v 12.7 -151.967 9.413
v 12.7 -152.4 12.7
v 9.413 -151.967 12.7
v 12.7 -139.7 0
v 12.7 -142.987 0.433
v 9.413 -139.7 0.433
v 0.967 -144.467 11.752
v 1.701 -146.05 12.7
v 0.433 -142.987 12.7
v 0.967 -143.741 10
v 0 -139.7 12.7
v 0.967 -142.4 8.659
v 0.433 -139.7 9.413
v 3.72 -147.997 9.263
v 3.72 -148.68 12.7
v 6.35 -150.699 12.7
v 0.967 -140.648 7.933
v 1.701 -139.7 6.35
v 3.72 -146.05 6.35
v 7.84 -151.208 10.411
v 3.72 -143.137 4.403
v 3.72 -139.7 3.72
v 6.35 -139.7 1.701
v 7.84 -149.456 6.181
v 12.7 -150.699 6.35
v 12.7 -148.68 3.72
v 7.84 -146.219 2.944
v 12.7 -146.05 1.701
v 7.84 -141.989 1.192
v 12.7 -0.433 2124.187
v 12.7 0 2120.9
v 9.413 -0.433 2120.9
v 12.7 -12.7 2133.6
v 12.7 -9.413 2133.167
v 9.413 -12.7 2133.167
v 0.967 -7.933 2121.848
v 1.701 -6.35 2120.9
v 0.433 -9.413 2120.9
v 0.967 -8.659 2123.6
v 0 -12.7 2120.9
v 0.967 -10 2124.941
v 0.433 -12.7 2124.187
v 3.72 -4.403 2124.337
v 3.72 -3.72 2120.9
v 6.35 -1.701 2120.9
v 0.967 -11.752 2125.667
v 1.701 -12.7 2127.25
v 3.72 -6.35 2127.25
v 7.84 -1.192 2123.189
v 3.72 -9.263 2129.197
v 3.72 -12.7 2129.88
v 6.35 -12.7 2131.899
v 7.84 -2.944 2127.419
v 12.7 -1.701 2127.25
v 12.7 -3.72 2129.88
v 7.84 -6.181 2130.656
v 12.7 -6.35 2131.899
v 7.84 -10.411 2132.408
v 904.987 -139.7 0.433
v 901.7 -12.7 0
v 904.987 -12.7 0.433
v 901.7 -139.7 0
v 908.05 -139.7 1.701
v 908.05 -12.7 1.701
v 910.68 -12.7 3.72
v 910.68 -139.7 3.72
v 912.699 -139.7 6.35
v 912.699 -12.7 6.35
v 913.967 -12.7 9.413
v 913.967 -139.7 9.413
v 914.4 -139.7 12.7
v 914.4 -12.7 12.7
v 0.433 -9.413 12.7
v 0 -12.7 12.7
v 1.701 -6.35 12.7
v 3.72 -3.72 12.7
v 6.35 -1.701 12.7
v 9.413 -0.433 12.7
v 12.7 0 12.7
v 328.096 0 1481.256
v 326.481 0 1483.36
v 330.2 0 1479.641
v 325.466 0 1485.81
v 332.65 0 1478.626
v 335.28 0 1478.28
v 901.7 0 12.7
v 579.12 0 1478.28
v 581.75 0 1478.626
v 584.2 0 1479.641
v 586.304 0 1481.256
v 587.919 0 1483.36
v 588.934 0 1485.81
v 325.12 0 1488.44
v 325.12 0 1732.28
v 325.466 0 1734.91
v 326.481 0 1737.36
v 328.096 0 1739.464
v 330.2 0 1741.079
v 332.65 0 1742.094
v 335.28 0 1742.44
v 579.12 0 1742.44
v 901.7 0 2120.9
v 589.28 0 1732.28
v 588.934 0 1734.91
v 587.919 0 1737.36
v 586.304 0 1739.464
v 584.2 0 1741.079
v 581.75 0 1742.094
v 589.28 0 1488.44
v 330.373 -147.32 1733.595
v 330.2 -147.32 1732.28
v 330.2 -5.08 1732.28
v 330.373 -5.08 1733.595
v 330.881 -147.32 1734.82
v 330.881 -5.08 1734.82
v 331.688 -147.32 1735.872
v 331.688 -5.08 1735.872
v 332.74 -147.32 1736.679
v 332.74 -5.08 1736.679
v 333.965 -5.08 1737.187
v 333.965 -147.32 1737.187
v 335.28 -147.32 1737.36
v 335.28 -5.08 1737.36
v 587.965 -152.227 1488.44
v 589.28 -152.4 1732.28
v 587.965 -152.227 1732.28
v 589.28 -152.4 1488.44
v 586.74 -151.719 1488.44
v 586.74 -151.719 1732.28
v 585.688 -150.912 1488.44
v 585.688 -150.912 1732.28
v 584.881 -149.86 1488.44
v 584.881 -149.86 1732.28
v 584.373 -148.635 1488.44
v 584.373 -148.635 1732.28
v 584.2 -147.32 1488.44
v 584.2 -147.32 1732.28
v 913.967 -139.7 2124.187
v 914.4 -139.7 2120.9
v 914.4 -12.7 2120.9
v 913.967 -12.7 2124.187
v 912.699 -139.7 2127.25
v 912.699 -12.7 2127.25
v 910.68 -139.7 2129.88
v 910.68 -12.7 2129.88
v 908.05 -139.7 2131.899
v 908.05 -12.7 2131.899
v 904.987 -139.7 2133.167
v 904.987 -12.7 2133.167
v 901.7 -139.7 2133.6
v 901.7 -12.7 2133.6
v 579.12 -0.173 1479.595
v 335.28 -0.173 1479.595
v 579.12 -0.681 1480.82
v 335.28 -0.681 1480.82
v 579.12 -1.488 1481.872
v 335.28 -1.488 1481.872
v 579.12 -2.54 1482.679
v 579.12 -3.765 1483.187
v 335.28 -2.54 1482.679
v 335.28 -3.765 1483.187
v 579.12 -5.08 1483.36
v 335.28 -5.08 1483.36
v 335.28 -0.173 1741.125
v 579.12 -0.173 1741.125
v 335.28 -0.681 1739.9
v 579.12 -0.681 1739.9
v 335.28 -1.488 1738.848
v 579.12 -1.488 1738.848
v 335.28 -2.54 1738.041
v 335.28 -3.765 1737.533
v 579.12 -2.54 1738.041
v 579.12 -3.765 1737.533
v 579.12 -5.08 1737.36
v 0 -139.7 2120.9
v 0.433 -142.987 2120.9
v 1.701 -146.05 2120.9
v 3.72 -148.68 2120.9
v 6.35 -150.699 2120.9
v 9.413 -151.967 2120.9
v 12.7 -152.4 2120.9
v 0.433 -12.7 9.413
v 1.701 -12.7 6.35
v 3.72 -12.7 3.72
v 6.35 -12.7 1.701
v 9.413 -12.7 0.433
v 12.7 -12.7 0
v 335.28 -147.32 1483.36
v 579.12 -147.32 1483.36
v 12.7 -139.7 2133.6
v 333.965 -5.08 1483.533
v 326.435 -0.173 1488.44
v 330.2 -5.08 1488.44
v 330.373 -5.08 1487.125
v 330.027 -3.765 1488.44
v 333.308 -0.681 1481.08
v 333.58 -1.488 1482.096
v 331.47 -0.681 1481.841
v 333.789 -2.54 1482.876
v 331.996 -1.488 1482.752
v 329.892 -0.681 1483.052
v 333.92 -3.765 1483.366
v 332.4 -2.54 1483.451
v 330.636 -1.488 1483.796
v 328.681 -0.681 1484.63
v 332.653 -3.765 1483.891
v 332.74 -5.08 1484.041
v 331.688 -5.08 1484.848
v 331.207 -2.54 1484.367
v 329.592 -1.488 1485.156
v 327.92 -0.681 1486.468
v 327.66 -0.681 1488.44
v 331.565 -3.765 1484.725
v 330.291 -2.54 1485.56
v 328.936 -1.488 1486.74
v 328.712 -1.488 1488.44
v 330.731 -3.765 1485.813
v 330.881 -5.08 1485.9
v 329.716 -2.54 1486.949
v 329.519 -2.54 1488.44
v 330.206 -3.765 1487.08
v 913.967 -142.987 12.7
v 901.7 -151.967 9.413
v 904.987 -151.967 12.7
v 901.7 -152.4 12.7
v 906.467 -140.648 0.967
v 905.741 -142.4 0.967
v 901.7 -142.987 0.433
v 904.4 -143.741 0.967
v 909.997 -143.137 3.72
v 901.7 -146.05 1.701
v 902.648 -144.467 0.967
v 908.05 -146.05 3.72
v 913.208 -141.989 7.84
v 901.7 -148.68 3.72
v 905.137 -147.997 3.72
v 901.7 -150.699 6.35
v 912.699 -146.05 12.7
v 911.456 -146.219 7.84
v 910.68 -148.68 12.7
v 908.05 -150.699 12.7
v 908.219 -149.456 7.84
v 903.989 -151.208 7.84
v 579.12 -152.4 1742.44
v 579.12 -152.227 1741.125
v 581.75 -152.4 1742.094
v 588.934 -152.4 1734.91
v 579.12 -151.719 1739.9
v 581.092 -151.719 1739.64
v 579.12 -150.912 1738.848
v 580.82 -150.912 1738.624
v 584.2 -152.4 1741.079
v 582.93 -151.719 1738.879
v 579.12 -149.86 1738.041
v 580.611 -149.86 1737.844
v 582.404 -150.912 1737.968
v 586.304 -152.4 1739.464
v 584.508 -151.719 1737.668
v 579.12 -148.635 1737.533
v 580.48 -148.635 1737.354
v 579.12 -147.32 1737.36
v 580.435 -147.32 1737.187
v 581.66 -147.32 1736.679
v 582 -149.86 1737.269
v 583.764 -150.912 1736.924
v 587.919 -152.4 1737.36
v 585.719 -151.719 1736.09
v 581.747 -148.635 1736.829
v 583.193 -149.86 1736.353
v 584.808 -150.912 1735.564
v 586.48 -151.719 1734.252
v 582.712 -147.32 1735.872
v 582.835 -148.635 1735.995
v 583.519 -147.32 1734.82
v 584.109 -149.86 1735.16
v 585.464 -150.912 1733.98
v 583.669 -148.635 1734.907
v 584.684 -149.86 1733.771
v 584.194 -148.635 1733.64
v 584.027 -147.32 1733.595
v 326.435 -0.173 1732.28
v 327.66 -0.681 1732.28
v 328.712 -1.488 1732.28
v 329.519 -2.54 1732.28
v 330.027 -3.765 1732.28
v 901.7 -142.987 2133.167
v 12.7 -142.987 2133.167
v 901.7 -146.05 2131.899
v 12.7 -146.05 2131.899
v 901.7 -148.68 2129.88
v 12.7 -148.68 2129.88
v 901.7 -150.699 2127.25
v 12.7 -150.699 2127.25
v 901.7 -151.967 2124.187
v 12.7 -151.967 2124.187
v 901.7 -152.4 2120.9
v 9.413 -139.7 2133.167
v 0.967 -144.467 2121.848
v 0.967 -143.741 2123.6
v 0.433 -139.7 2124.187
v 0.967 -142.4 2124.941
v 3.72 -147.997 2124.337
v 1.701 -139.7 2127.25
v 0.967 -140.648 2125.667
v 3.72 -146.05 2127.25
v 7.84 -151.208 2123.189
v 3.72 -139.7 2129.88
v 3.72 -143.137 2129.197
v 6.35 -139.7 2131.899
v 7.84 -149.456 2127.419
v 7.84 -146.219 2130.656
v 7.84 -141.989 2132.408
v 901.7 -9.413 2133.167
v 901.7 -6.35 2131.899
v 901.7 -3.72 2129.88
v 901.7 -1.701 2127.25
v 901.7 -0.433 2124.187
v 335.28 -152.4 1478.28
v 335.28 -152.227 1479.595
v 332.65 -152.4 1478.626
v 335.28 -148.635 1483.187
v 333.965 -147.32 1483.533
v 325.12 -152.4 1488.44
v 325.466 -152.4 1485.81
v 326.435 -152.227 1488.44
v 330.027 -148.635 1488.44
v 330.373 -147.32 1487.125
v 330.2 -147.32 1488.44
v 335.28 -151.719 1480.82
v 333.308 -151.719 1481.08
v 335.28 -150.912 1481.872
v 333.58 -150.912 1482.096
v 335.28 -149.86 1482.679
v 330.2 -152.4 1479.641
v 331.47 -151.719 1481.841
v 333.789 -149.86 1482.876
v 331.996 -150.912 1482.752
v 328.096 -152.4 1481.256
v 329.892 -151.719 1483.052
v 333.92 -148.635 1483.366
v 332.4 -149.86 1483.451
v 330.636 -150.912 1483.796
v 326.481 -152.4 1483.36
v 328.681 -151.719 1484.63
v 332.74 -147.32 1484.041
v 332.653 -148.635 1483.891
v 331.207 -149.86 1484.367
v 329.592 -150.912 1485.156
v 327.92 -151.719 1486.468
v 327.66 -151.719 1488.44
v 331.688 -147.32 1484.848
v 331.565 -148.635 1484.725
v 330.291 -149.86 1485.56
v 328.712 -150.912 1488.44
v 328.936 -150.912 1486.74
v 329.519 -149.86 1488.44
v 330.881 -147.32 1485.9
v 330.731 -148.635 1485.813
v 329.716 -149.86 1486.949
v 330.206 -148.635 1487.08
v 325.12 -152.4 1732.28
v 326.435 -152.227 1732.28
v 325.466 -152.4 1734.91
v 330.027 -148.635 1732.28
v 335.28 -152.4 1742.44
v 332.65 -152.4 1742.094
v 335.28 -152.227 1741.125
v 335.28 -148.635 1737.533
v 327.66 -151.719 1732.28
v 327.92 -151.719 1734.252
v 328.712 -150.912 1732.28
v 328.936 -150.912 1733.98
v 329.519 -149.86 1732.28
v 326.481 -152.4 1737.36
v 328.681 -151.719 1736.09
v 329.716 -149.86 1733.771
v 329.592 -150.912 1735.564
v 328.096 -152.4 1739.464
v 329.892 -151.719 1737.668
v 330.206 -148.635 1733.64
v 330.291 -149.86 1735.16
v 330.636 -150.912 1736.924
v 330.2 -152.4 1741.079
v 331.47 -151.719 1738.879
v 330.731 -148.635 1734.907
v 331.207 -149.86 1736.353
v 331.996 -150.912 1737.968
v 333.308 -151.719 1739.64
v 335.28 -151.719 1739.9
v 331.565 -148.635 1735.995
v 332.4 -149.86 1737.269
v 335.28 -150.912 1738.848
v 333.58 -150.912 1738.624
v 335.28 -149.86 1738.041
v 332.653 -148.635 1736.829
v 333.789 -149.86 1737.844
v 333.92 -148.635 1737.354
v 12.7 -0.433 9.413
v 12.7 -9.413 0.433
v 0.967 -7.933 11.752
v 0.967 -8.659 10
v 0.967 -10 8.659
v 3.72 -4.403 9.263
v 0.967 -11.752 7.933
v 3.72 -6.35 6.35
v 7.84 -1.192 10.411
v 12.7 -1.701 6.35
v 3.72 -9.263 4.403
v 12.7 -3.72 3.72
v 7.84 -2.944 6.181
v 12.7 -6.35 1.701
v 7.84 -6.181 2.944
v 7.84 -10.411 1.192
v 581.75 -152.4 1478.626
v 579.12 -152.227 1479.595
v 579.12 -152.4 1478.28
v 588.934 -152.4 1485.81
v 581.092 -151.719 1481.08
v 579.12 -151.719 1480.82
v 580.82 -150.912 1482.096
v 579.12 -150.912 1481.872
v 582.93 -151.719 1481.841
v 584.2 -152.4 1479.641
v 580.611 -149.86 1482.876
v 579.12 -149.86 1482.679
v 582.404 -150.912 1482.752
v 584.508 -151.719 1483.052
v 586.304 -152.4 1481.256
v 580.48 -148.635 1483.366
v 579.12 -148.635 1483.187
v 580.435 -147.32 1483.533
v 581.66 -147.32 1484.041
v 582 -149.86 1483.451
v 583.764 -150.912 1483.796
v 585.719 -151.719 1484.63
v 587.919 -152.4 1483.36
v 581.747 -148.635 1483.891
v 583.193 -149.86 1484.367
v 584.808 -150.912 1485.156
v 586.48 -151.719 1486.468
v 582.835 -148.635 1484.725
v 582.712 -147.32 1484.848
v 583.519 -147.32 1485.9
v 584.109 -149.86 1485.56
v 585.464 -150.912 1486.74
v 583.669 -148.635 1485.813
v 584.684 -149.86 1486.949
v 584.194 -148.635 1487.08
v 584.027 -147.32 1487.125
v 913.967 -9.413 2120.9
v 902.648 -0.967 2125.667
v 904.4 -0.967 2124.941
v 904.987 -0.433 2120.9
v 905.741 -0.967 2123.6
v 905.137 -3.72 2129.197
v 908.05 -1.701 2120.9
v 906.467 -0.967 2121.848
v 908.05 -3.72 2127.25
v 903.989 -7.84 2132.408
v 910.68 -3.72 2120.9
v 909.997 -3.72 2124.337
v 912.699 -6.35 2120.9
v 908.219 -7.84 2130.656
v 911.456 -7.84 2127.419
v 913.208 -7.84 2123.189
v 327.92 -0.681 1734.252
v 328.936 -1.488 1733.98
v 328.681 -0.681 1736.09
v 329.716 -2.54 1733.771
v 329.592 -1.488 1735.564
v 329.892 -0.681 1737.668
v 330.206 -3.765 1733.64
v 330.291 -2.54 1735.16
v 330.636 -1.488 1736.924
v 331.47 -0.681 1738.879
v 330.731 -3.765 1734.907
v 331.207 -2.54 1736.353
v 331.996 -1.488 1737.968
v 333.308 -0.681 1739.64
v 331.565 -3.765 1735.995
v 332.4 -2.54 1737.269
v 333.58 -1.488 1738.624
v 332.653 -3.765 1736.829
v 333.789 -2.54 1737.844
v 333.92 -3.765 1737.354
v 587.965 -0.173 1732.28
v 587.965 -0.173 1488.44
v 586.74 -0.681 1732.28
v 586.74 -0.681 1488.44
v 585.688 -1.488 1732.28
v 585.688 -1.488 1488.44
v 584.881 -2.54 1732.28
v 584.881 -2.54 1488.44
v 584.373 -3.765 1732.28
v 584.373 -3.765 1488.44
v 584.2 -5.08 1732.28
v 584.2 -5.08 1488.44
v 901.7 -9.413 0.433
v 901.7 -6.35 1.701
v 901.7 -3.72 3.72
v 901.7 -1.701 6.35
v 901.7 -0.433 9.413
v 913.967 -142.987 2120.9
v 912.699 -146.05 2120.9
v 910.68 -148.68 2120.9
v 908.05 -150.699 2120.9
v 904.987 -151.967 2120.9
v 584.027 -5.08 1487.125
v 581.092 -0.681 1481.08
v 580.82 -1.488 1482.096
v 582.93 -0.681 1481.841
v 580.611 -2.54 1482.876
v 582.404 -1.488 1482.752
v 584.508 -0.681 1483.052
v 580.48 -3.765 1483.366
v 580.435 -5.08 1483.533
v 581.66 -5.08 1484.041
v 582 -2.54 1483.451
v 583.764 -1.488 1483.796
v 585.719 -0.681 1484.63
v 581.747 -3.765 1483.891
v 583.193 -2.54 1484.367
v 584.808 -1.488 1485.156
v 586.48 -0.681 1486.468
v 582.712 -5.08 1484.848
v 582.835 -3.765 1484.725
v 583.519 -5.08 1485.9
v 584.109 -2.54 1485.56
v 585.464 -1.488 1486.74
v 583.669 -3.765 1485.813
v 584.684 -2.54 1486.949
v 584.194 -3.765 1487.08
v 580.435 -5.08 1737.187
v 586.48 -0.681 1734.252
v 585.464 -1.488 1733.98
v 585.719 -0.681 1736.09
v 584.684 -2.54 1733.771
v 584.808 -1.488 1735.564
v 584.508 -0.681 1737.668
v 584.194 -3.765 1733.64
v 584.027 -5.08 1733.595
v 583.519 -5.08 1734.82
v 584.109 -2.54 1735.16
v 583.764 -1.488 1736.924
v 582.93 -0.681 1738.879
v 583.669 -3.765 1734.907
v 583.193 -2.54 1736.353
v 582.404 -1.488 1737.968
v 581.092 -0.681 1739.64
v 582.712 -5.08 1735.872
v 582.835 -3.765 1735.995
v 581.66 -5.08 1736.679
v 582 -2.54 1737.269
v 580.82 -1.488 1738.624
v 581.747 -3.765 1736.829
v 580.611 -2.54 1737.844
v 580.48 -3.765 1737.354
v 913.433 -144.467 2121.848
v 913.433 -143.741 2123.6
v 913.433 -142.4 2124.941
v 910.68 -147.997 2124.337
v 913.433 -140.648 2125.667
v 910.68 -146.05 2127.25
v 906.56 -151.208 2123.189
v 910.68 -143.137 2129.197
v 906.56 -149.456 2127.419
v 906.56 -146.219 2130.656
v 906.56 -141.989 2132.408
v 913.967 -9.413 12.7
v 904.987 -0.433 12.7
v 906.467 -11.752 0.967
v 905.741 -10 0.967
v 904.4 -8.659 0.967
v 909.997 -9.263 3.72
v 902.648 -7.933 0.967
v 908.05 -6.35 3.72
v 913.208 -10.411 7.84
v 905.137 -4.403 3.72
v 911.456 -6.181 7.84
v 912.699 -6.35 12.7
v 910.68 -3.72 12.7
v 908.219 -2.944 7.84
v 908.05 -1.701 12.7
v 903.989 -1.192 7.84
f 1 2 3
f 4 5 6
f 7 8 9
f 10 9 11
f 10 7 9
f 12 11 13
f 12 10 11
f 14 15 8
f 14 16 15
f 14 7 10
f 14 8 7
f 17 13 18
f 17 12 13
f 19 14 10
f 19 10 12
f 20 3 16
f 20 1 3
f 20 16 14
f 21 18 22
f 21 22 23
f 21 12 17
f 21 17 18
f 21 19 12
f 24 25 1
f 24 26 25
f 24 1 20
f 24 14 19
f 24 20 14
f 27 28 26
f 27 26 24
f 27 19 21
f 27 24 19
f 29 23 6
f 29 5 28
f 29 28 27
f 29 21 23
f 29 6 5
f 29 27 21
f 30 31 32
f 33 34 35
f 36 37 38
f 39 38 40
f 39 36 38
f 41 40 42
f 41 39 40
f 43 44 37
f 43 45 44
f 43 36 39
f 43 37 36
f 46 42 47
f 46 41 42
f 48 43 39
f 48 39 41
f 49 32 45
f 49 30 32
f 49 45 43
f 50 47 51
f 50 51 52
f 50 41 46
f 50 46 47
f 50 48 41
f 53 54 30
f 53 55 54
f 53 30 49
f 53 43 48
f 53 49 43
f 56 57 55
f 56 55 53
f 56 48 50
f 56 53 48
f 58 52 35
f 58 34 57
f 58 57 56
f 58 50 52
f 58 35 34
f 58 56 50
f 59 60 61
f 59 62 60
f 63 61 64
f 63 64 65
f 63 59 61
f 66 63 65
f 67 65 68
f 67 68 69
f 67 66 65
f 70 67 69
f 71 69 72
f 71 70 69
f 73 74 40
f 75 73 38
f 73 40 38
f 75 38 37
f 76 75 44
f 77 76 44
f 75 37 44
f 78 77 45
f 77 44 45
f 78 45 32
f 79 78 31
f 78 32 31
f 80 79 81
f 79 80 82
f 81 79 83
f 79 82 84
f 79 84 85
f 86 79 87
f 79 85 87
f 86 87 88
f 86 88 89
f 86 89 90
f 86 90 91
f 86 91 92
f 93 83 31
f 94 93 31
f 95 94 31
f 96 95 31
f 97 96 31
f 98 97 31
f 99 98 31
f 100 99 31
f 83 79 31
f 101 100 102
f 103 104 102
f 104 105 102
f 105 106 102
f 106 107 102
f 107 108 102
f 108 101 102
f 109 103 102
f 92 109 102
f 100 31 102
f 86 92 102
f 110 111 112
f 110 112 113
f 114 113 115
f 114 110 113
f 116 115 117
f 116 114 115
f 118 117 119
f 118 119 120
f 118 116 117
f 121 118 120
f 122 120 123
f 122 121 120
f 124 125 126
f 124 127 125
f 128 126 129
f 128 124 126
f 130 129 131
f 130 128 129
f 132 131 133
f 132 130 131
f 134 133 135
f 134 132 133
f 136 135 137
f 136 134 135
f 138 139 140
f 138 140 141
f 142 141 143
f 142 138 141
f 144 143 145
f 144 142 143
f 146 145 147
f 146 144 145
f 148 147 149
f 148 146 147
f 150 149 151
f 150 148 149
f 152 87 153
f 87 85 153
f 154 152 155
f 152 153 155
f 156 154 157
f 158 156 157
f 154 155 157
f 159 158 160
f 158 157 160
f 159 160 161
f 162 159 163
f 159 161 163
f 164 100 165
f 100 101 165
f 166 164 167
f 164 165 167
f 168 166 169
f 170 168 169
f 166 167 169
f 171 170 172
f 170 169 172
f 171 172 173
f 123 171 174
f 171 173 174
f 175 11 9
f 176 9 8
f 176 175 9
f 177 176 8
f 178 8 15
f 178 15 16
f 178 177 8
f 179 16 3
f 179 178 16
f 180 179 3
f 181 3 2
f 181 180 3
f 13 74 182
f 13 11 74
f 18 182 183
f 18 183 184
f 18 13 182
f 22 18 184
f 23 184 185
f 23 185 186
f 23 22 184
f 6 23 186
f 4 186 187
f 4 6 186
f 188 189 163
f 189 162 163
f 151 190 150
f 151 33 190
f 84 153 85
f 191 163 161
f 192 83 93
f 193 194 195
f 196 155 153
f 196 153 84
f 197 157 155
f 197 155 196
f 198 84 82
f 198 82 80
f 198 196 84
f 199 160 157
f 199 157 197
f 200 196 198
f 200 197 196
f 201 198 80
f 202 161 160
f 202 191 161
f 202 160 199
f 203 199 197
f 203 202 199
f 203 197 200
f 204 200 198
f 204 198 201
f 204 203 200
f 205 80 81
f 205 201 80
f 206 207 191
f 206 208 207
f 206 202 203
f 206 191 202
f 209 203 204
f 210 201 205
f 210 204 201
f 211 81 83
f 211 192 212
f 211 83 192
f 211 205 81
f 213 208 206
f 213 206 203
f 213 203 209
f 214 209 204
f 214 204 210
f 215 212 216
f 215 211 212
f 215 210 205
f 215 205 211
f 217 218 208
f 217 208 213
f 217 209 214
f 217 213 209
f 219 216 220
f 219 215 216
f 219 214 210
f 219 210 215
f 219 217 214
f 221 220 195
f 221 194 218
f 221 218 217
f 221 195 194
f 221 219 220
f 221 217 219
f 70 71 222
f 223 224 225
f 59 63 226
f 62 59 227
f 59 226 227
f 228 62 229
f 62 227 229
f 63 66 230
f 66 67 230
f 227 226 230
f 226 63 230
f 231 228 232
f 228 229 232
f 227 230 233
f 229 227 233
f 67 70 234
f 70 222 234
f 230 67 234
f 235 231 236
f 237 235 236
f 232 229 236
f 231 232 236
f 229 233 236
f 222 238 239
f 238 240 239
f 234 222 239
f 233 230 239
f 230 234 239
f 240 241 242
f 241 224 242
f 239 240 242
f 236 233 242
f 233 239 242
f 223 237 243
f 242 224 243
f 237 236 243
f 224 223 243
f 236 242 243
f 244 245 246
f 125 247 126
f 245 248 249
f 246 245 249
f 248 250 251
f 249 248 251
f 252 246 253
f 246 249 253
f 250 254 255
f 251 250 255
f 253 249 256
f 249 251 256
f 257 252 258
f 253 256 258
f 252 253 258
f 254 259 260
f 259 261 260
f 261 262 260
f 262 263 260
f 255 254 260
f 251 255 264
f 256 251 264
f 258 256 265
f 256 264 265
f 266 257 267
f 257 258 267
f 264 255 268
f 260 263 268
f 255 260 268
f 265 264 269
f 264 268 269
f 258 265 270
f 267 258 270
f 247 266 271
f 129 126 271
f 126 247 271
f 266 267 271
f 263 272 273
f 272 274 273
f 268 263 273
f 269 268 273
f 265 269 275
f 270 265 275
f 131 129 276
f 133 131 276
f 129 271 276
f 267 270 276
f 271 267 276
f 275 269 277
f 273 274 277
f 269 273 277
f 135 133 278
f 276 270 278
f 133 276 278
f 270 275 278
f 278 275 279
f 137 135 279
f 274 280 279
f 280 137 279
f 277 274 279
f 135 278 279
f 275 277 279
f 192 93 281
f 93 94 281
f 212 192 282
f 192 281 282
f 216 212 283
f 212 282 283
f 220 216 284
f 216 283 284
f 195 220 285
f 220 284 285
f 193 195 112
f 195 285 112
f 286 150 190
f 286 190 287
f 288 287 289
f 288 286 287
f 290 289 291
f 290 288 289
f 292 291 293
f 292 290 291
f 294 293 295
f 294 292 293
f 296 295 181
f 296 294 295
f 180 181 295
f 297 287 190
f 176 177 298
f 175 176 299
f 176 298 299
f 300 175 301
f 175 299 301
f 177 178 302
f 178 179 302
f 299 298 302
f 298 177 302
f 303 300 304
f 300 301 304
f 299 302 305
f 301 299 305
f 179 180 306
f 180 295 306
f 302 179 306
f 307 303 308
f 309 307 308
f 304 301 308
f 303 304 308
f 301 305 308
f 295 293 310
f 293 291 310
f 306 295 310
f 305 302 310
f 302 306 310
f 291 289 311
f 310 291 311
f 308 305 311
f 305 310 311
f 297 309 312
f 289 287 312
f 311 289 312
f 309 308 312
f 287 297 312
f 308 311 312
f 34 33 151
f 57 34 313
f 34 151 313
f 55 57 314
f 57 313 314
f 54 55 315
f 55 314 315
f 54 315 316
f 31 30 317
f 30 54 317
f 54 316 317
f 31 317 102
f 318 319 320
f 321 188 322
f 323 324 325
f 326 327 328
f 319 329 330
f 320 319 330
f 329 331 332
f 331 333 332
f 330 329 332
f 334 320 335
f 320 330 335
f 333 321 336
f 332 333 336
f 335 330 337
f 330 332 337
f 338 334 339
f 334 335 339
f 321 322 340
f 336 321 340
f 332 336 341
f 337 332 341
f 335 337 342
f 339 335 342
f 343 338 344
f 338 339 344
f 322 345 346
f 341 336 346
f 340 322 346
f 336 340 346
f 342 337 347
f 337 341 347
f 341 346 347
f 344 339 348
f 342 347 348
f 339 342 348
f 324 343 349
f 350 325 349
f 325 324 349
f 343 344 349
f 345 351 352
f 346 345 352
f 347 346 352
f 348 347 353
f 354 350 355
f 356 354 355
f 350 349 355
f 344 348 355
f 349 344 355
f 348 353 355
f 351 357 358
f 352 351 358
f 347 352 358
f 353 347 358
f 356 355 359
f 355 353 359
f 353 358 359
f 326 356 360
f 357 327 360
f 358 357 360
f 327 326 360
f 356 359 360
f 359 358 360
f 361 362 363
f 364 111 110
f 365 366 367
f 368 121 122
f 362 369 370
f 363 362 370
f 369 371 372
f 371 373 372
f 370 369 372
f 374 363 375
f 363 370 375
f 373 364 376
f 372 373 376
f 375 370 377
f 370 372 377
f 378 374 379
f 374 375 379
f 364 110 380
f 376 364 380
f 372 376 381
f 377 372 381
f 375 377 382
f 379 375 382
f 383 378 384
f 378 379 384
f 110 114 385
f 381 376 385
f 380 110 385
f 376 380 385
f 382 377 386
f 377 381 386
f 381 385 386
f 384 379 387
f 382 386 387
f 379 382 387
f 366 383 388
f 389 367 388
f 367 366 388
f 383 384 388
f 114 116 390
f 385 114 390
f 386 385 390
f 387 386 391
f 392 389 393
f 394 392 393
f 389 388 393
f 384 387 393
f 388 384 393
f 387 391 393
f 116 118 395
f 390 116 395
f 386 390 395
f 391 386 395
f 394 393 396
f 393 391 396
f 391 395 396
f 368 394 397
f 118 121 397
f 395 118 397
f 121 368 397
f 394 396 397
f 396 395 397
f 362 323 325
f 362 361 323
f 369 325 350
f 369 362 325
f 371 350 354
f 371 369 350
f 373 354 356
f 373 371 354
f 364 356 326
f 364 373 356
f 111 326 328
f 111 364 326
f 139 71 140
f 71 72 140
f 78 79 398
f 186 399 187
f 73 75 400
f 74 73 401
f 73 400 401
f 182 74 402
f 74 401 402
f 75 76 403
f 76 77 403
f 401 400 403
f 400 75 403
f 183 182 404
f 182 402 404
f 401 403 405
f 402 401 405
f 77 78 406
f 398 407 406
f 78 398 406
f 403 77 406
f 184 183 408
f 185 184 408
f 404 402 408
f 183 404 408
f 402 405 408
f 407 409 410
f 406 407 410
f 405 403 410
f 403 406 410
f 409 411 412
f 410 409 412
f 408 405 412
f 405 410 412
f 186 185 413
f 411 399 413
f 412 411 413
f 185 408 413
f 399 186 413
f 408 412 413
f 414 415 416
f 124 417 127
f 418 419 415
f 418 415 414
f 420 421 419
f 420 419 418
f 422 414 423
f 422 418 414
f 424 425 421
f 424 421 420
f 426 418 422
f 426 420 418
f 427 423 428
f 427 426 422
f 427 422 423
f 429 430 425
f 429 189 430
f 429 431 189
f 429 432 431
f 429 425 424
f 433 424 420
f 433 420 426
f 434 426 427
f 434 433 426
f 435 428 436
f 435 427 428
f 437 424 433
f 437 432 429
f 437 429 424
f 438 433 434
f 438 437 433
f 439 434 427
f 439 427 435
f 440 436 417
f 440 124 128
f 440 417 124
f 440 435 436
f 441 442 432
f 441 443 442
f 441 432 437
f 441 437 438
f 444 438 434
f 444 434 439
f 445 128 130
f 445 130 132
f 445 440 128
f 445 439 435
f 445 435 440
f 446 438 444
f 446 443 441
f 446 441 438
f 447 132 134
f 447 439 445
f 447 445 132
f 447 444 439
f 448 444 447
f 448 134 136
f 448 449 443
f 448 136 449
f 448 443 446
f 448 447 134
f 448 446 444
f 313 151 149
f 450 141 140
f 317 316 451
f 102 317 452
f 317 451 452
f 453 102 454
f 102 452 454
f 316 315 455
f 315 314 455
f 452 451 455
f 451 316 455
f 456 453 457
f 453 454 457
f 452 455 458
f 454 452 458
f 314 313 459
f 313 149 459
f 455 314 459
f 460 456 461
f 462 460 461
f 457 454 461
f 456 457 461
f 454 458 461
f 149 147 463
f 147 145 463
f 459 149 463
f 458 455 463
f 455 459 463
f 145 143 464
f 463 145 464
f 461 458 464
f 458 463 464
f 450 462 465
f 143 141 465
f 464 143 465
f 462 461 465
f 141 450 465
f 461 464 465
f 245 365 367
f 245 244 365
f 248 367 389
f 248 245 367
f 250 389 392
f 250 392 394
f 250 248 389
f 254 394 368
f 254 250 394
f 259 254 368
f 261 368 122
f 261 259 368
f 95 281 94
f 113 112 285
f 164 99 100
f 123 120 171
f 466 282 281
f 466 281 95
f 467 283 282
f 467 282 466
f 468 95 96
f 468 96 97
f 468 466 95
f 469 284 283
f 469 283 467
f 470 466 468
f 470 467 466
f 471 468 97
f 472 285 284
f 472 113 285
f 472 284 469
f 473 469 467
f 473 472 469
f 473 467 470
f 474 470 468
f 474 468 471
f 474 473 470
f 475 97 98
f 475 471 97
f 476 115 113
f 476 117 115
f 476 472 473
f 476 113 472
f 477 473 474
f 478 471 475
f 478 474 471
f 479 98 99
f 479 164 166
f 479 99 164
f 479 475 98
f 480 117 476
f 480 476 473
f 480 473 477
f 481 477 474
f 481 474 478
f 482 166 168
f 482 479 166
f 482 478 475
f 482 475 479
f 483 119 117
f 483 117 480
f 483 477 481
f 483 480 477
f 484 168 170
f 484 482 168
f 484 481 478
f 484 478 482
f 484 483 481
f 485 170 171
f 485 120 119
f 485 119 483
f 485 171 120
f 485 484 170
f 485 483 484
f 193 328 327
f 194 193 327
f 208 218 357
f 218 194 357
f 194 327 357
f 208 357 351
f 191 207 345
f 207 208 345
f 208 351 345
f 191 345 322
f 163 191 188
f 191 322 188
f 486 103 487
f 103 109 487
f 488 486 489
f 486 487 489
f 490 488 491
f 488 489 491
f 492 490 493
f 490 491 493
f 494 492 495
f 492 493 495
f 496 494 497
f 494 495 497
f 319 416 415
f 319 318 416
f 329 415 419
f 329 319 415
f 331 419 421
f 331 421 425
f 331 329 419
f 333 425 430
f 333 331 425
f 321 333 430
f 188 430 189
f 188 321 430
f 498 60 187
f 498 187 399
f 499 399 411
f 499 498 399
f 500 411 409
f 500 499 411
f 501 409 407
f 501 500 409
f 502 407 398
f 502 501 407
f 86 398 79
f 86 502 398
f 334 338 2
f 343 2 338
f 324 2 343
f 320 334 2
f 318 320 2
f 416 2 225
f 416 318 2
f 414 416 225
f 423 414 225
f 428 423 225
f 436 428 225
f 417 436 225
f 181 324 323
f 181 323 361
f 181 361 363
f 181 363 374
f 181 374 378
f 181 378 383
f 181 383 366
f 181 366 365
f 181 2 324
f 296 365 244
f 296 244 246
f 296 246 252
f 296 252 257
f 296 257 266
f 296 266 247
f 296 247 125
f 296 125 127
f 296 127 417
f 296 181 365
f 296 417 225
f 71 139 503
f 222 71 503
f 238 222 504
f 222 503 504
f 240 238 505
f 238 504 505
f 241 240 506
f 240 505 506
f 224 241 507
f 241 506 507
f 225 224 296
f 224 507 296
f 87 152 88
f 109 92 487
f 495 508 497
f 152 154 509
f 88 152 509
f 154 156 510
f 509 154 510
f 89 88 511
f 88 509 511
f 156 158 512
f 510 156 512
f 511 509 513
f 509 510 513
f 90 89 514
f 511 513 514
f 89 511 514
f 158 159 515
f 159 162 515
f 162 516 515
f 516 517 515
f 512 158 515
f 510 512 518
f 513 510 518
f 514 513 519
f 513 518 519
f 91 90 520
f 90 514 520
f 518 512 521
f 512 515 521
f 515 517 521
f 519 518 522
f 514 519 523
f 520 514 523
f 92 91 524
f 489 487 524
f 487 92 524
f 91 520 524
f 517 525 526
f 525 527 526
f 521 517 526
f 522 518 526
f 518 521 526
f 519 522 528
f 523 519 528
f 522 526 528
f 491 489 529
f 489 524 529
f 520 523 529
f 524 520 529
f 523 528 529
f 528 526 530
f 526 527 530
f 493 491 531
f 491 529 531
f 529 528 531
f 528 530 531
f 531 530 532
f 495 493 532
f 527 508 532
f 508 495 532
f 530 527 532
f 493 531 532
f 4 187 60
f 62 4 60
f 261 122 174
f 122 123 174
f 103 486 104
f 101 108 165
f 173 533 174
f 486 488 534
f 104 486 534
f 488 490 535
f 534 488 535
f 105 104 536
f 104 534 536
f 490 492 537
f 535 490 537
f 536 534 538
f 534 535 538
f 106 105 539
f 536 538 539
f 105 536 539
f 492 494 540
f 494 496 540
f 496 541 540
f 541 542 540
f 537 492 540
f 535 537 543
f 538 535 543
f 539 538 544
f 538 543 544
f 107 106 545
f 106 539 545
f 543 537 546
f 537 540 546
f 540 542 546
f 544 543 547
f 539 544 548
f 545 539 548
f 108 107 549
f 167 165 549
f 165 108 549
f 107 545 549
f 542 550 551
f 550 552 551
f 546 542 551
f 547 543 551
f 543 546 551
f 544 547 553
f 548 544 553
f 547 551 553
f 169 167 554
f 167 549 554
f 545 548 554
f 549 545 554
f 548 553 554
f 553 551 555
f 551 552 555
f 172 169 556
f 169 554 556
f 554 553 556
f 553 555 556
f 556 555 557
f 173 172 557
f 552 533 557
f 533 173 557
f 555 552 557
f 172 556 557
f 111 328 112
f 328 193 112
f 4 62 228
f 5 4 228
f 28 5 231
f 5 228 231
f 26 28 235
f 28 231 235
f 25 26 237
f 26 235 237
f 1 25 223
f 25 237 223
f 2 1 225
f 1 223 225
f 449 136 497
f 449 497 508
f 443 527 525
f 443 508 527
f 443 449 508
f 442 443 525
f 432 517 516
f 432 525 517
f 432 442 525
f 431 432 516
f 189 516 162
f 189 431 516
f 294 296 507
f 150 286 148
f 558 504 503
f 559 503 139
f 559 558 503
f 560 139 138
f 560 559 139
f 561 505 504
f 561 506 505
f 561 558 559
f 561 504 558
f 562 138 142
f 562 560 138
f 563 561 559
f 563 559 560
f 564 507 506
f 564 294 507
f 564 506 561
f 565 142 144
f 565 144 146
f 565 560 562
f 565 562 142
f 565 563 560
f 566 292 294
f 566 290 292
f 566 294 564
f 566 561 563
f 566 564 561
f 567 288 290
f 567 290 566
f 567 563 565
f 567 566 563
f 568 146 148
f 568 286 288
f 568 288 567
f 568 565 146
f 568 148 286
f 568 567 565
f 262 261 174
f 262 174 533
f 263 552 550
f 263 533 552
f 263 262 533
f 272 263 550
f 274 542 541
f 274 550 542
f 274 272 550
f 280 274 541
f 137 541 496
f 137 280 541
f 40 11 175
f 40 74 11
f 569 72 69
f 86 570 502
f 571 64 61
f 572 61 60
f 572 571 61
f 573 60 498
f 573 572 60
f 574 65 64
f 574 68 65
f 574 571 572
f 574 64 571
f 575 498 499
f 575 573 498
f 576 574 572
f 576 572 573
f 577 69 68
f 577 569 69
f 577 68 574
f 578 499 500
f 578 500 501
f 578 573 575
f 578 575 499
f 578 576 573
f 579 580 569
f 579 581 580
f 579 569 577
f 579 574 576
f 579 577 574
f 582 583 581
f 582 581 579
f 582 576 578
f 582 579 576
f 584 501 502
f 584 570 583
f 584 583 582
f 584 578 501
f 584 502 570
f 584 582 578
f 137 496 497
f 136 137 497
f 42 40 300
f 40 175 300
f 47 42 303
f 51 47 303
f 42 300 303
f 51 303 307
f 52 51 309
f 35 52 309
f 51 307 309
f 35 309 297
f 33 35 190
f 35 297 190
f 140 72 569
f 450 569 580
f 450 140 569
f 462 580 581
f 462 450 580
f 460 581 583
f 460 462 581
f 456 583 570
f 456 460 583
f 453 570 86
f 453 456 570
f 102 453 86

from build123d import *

# Parameters (mm, degrees)
F0_W     = 914.4
F0_H     = 2133.6
F1_DEPTH = 152.4
F2_R     = 12.7
F3_R     = 5.08


# Not quite as in the source:
# - a feature names something its author has since deleted; it is built from what else it names


with BuildPart() as f1:
    # F0 (on Front) → F1 (new body)
    with BuildSketch(Plane.XZ):
        with Locations((457.2, 1066.8)):
            Rectangle(F0_W, F0_H)
        Polygon((330.2, 1737.36), (457.2, 1737.36), (584.2, 1737.36), (584.2, 1483.36), (330.2, 1483.36), align=None, mode=Mode.SUBTRACT)
    extrude(amount=F1_DEPTH)

    # F2
    f2_edges = [f1.edges().sort_by_distance(p)[0] for p in [
        (457.2, -152.4, 2133.6),
        (914.4, -152.4, 1066.8),
        (914.4, -76.2, 2133.6),
        (457.2, 0, 2133.6),
        (914.4, 0, 1066.8),
        (914.4, -76.2, 0),
        (457.2, -152.4, 0),
        (0, -152.4, 1066.8),
        (457.2, 0, 0),
        (0, 0, 1066.8),
        (0, -76.2, 0),
        (0, -76.2, 2133.6),
    ]]
    fillet(f2_edges, radius=F2_R)

    # F3
    f3_edges = [f1.edges().sort_by_distance(p)[0] for p in [
        (457.2, -152.4, 1483.36),
        (330.2, -152.4, 1610.36),
        (457.2, -152.4, 1737.36),
        (457.2, 0, 1483.36),
        (330.2, 0, 1610.36),
        (584.2, 0, 1610.36),
        (457.2, 0, 1737.36),
        (584.2, -152.4, 1610.36),
        (584.2, -76.2, 1483.36),
        (330.2, -76.2, 1483.36),
        (330.2, -76.2, 1737.36),
        (584.2, -76.2, 1737.36),
    ]]
    fillet(f3_edges, radius=F3_R)


solid = f1.part
